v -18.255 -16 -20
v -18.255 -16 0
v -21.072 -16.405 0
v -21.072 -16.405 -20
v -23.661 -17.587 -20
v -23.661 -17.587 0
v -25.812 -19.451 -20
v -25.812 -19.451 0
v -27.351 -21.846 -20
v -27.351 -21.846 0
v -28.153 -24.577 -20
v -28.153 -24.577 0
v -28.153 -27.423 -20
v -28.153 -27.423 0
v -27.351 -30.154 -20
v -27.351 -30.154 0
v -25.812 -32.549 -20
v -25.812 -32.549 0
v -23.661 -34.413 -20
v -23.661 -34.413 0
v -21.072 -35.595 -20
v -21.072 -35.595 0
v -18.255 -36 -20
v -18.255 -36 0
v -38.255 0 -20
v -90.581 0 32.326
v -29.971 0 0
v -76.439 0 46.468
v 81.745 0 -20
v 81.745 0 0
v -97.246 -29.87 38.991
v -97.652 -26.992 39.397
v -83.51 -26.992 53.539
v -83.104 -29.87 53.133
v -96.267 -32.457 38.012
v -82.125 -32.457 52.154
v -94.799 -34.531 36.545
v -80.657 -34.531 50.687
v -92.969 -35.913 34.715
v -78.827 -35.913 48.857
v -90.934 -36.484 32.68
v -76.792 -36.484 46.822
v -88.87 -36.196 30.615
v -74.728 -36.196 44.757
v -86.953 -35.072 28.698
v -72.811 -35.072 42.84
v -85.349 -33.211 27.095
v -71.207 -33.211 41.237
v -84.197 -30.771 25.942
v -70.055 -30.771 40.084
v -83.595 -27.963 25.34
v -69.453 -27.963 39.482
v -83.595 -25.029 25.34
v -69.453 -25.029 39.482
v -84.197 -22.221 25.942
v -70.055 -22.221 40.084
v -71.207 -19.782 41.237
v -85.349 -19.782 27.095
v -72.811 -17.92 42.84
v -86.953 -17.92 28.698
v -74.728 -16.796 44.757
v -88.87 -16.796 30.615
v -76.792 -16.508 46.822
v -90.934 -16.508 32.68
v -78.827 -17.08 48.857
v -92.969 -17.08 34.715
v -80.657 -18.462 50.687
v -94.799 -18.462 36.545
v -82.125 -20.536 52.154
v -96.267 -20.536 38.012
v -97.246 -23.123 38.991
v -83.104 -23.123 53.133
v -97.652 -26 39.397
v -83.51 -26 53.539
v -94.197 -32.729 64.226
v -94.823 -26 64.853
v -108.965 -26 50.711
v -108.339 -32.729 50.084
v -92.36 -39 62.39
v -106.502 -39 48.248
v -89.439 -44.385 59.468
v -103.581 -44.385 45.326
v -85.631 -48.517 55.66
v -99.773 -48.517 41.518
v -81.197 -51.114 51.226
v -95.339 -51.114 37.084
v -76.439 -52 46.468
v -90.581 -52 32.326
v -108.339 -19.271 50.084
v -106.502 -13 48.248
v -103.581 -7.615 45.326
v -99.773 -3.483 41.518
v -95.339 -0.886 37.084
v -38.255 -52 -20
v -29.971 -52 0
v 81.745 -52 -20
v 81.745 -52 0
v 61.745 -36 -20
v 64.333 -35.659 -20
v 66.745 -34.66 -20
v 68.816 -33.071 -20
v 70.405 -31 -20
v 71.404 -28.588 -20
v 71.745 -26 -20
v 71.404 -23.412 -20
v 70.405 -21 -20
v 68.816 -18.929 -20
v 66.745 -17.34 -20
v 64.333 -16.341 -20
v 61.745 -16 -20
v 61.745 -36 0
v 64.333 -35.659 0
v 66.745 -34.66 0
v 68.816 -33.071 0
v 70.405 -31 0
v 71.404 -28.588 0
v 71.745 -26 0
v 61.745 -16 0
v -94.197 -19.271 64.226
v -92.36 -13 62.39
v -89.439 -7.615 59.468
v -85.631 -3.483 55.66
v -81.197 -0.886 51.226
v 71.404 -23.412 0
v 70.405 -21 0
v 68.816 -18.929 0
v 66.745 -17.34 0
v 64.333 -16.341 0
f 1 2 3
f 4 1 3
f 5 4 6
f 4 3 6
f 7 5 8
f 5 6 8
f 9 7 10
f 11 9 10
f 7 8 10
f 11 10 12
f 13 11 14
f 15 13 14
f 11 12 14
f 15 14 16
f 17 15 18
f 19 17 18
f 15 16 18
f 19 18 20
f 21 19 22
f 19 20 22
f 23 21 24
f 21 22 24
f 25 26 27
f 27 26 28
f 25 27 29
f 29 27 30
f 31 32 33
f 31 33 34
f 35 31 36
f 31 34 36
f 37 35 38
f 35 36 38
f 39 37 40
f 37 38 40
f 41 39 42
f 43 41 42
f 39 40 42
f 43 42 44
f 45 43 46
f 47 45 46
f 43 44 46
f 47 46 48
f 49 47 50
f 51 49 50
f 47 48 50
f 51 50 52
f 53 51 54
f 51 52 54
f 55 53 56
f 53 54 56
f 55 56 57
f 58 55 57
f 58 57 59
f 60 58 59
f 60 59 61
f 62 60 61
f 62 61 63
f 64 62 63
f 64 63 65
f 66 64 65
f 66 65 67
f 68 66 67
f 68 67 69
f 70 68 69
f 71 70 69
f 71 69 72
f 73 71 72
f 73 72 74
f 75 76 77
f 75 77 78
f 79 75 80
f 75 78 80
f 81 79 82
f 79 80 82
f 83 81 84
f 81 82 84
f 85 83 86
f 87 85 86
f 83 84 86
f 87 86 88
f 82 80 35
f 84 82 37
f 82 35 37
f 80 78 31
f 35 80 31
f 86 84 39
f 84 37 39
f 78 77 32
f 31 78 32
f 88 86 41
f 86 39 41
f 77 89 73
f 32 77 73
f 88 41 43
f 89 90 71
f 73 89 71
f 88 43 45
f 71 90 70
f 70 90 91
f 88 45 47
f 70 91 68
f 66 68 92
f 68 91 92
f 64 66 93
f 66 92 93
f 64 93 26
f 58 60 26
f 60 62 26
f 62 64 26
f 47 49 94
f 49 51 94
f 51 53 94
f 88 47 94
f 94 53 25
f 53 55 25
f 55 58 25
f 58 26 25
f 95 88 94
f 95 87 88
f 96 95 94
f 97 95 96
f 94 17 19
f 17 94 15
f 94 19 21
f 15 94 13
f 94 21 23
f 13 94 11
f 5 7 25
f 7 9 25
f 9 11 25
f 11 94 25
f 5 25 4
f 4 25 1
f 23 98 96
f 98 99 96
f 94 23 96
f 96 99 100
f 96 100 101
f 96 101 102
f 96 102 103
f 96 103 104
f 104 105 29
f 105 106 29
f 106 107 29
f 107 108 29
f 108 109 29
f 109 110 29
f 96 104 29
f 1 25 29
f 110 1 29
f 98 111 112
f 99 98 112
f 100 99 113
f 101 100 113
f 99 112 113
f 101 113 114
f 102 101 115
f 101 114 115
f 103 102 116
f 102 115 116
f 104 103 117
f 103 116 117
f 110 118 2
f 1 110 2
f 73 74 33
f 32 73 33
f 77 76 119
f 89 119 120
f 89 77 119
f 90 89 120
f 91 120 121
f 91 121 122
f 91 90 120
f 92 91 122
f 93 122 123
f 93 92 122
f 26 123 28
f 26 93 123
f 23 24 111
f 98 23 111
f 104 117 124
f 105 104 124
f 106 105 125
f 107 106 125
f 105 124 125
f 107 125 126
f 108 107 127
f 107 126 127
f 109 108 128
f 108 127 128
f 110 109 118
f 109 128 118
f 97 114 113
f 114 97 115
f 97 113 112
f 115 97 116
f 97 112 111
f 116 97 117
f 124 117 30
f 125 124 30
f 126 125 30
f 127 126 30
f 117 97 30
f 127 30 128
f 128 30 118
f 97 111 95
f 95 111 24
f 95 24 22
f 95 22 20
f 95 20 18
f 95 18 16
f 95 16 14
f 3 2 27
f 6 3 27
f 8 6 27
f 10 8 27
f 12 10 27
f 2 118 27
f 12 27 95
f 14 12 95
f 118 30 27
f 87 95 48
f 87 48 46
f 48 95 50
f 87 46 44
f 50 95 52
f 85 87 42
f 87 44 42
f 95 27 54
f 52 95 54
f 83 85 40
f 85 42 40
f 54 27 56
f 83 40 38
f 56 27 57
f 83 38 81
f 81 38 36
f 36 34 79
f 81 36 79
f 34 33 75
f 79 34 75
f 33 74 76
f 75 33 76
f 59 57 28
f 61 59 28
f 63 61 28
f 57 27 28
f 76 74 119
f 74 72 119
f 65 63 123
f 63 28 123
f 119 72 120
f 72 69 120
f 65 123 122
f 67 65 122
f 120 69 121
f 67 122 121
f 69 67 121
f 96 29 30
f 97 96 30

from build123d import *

# Parameters (mm, degrees)
F1_DEPTH = 52
F3_DEPTH = 20
F5_DEPTH = 25
F6_R     = 26
F7_R     = 25.99999


# Not quite as in the source:
# - a fillet or chamfer is up to 0.001 mm smaller than in the source, because OpenCascade refuses the exact size


with BuildPart() as f1:
    # F0 (on Front) → F1 (new body)
    with BuildSketch(Plane.XZ):
        Polygon((-38.2547932683, -20), (-38.2547932683, 0), (-35.5326342583, 0), (-29.9705220208, 0), (-94.8233357632, 64.8528137424), (-108.9654713869, 50.7106781187), align=None)
        Polygon((-35.5326342583, 0), (-38.2547932683, 0), (-38.2547932683, -20), (-9.9705220208, -20), (-29.9705220208, 0), align=None)
        Polygon((81.7452067317, 0), (-29.9705220208, 0), (-9.9705220208, -20), (81.7452067317, -20), align=None)
    extrude(amount=F1_DEPTH)

    # F2 (on face) → F3 (cut)
    with BuildSketch(Plane.XY):
        with BuildLine():
            Line((-18.2547932683, -36), (61.7452067317, -36))
            ThreePointArc((61.7452067317, -36), (68.8162745436, -33.0710678119), (71.7452067317, -26))
            ThreePointArc((71.7452067317, -26), (68.8162745436, -18.9289321881), (61.7452067317, -16))
            Line((61.7452067317, -16), (-18.2547932683, -16))
            ThreePointArc((-18.2547932683, -16), (-28.2547932683, -26), (-18.2547932683, -36))
        make_face()
    extrude(amount=-F3_DEPTH, mode=Mode.SUBTRACT)

    # F4 (on face) → F5 (cut)
    with BuildSketch(Plane(origin=(-14.9852610104, 0, -14.9852610104), x_dir=(0, 1, 0), z_dir=(0.7071067812, 0, 0.7071067812))):
        with BuildLine():
            ThreePointArc((-16.4961378883, 86.9204033326), (-19.2517821929, 93.8138285014), (-26, 96.9080881091))
            Line((-26, 96.9080881091), (-26.9922757766, 96.9080881091))
            ThreePointArc((-26.9922757766, 96.9080881091), (-33.3895630572, 79.6760476372), (-16.4961378883, 86.9204033326))
        make_face()
    extrude(amount=-F5_DEPTH, mode=Mode.SUBTRACT)

    # F6
    f6_edges = [f1.edges().sort_by_distance(p)[0] for p in [
        (-101.894404, -52, 57.781746),
    ]]
    fillet(f6_edges, radius=F6_R)

    # F7 (radius 26 in the source; OpenCascade refuses exactly that, so slightly less here)
    f7_edges = [f1.edges().sort_by_distance(p)[0] for p in [
        (-101.894404, 0, 57.781746),
    ]]
    fillet(f7_edges, radius=F7_R)


solid = f1.part
